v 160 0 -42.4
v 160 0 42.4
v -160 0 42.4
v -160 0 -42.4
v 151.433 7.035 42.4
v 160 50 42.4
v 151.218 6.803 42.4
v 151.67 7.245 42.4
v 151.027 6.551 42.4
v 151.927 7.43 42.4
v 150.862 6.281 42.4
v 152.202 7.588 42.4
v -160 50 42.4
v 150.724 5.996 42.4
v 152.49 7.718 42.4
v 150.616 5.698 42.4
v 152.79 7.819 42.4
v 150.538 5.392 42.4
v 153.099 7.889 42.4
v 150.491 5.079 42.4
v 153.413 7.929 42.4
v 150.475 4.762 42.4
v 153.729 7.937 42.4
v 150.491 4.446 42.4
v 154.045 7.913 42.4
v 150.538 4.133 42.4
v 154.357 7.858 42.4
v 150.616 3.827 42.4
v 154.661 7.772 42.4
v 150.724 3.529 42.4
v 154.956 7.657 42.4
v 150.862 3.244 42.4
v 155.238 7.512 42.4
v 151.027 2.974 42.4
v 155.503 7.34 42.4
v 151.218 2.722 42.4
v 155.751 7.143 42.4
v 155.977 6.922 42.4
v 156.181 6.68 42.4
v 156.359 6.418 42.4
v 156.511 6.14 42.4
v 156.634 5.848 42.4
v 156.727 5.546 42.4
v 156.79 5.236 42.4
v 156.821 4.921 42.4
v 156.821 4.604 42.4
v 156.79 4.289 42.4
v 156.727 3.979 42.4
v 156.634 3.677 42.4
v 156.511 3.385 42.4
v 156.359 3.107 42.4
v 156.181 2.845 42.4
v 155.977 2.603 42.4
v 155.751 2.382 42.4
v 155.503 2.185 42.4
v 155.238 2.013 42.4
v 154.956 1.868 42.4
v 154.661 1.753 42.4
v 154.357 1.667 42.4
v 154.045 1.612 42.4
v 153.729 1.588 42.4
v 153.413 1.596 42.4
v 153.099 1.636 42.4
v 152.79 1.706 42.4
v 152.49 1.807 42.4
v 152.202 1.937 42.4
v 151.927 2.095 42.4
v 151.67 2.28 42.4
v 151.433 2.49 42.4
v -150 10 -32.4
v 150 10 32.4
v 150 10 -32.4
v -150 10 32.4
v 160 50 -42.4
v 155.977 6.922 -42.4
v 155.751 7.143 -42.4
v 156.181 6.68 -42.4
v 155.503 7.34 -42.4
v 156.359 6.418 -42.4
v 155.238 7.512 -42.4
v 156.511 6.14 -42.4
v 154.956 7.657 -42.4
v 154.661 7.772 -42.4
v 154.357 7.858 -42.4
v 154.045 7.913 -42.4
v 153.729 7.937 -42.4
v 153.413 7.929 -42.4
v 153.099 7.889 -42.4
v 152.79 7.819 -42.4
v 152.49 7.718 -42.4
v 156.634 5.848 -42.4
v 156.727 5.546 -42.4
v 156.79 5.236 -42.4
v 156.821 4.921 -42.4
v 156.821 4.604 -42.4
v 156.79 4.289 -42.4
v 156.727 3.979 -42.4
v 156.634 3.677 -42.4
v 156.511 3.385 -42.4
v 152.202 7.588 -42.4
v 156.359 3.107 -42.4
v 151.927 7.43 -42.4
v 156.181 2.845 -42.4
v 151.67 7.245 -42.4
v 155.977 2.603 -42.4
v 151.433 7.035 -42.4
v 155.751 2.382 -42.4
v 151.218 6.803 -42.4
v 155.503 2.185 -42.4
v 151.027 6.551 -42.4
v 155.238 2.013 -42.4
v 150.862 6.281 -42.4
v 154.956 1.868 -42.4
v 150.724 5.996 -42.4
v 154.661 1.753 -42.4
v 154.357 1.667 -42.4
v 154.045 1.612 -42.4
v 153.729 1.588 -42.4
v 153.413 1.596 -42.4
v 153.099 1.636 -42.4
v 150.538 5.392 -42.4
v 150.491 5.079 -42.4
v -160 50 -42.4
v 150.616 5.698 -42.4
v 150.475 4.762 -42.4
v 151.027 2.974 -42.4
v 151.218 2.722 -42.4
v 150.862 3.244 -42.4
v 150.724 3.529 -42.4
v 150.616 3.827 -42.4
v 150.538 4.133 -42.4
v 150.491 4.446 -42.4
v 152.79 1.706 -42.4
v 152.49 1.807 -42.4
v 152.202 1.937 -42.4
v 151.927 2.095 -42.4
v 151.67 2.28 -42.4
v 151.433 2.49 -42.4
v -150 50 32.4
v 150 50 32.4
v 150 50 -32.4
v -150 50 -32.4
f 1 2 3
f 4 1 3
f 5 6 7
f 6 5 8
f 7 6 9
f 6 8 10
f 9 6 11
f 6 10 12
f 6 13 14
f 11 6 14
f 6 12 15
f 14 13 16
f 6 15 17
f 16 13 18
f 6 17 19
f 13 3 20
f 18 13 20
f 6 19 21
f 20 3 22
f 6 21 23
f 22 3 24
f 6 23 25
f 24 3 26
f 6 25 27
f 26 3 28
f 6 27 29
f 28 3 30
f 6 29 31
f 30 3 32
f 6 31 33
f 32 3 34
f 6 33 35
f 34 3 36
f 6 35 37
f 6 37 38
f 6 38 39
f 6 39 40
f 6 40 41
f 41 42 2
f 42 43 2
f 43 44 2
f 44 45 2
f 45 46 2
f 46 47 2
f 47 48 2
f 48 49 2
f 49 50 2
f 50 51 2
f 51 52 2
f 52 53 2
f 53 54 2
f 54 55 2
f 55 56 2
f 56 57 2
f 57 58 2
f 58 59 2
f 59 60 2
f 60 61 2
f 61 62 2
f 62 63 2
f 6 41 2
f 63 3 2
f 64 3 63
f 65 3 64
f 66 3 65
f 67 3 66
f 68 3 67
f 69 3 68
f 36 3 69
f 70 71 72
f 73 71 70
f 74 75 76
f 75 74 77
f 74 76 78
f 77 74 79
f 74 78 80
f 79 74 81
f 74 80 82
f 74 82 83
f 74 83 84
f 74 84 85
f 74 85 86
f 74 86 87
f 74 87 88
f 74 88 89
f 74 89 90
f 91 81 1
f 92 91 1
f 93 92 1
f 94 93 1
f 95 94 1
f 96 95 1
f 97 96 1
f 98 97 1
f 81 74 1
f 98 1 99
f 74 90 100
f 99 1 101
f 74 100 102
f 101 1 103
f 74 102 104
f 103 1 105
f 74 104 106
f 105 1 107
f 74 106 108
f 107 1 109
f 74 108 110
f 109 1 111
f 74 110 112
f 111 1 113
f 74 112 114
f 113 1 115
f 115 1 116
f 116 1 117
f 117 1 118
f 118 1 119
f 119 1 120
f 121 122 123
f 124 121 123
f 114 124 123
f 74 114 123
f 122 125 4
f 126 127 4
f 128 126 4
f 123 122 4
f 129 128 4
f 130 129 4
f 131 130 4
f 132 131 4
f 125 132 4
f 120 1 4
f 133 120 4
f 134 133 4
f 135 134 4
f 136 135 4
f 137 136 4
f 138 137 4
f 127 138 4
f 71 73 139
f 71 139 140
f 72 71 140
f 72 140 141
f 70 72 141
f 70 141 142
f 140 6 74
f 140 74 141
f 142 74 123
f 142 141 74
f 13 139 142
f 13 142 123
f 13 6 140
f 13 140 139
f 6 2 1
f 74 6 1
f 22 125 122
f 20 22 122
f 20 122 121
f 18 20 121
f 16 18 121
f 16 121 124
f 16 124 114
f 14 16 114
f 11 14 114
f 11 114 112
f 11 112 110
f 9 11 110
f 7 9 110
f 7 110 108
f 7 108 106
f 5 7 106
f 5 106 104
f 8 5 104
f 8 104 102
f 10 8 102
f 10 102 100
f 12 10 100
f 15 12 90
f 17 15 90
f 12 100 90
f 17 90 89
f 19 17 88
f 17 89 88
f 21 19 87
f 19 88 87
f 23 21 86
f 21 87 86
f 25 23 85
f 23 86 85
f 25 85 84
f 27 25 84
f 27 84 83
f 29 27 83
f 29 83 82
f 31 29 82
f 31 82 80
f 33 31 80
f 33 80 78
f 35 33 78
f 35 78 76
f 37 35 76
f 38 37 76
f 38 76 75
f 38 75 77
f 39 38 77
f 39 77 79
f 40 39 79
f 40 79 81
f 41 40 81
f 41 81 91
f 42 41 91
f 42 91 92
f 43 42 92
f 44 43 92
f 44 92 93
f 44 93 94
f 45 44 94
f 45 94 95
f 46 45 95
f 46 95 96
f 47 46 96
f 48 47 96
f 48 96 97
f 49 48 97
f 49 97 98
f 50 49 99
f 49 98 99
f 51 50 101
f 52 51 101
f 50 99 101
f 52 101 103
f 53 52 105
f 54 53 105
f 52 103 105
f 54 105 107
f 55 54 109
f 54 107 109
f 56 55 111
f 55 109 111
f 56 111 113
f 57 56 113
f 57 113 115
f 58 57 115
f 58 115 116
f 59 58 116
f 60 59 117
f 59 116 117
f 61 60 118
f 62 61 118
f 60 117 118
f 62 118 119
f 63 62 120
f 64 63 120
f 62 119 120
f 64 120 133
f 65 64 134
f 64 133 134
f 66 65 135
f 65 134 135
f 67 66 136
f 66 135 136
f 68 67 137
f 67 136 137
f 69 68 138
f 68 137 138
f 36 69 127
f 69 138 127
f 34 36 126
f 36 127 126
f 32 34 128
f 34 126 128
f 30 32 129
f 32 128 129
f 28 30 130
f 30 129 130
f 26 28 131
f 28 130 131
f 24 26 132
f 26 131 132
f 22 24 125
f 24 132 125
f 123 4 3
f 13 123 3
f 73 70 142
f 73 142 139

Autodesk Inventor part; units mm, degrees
ref_plane "YZ Plane" through (0, 0, 0) normal (1, 0, 0) x (0, 1, 0)
ref_plane "XZ Plane" through (0, 0, 0) normal (0, 1, 0) x (-1, 0, 0)
ref_plane "XY Plane" through (0, 0, 0) normal (0, 0, 1) x (1, 0, 0)
sketch "Sketch1" plane through (0, 0, 0) normal (0, 1, 0) x (-1, 0, 0)
  line L0 (150, 32.4) -> (-150, 32.4)
  line L1 (-150, 32.4) -> (-150, -32.4)
  line L2 (-150, -32.4) -> (150, -32.4)
  line L3 (150, -32.4) -> (150, 32.4)
  line L4 (150, 32.4) -> (-150, -32.4) construction
  line L5 (-150, 32.4) -> (150, -32.4) construction
  line L6 (160, 42.4) -> (-160, 42.4)
  line L7 (-160, 42.4) -> (-160, -42.4)
  line L8 (-160, -42.4) -> (160, -42.4)
  line L9 (160, -42.4) -> (160, 42.4)
  point P0 (0, 0)
  dimension "d0" = 64.8
  dimension "d1" = 300
  dimension "d2" = 10
  dimension "d15" = 84.8
extrude "Extrusion1" add sketch "Sketch1" along normal blind 10 contours L3 L2 L1 L0
extrude "Extrusion2" add sketch "Sketch1" along normal blind 50
sketch "Sketch2" plane through (160, 0, -42.4) normal (0, 0, -1) x (-1, 0, 0)
  point P0 (160, 0)
sketch "Sketch6" plane through (160, 0, -42.4) normal (0, 0, -1) x (-1, 0, 0)
  point P0 (160, 0)
sketch "Sketch7" plane through (160, 0, -42.4) normal (0, 0, -1) x (-1, 0, 0)
  point P0 (160, 0)
sketch "Sketch8" plane through (160, 0, -42.4) normal (0, 0, -1) x (-1, 0, 0)
  circle A0 centre (6.35, 4.7625) radius 3.175
  point P0 (160, 0)
  dimension "d12" = 6.35
extrude "Extrusion5" cut sketch "Sketch8" along normal mid plane 1000
properties part number "GiveBox"
